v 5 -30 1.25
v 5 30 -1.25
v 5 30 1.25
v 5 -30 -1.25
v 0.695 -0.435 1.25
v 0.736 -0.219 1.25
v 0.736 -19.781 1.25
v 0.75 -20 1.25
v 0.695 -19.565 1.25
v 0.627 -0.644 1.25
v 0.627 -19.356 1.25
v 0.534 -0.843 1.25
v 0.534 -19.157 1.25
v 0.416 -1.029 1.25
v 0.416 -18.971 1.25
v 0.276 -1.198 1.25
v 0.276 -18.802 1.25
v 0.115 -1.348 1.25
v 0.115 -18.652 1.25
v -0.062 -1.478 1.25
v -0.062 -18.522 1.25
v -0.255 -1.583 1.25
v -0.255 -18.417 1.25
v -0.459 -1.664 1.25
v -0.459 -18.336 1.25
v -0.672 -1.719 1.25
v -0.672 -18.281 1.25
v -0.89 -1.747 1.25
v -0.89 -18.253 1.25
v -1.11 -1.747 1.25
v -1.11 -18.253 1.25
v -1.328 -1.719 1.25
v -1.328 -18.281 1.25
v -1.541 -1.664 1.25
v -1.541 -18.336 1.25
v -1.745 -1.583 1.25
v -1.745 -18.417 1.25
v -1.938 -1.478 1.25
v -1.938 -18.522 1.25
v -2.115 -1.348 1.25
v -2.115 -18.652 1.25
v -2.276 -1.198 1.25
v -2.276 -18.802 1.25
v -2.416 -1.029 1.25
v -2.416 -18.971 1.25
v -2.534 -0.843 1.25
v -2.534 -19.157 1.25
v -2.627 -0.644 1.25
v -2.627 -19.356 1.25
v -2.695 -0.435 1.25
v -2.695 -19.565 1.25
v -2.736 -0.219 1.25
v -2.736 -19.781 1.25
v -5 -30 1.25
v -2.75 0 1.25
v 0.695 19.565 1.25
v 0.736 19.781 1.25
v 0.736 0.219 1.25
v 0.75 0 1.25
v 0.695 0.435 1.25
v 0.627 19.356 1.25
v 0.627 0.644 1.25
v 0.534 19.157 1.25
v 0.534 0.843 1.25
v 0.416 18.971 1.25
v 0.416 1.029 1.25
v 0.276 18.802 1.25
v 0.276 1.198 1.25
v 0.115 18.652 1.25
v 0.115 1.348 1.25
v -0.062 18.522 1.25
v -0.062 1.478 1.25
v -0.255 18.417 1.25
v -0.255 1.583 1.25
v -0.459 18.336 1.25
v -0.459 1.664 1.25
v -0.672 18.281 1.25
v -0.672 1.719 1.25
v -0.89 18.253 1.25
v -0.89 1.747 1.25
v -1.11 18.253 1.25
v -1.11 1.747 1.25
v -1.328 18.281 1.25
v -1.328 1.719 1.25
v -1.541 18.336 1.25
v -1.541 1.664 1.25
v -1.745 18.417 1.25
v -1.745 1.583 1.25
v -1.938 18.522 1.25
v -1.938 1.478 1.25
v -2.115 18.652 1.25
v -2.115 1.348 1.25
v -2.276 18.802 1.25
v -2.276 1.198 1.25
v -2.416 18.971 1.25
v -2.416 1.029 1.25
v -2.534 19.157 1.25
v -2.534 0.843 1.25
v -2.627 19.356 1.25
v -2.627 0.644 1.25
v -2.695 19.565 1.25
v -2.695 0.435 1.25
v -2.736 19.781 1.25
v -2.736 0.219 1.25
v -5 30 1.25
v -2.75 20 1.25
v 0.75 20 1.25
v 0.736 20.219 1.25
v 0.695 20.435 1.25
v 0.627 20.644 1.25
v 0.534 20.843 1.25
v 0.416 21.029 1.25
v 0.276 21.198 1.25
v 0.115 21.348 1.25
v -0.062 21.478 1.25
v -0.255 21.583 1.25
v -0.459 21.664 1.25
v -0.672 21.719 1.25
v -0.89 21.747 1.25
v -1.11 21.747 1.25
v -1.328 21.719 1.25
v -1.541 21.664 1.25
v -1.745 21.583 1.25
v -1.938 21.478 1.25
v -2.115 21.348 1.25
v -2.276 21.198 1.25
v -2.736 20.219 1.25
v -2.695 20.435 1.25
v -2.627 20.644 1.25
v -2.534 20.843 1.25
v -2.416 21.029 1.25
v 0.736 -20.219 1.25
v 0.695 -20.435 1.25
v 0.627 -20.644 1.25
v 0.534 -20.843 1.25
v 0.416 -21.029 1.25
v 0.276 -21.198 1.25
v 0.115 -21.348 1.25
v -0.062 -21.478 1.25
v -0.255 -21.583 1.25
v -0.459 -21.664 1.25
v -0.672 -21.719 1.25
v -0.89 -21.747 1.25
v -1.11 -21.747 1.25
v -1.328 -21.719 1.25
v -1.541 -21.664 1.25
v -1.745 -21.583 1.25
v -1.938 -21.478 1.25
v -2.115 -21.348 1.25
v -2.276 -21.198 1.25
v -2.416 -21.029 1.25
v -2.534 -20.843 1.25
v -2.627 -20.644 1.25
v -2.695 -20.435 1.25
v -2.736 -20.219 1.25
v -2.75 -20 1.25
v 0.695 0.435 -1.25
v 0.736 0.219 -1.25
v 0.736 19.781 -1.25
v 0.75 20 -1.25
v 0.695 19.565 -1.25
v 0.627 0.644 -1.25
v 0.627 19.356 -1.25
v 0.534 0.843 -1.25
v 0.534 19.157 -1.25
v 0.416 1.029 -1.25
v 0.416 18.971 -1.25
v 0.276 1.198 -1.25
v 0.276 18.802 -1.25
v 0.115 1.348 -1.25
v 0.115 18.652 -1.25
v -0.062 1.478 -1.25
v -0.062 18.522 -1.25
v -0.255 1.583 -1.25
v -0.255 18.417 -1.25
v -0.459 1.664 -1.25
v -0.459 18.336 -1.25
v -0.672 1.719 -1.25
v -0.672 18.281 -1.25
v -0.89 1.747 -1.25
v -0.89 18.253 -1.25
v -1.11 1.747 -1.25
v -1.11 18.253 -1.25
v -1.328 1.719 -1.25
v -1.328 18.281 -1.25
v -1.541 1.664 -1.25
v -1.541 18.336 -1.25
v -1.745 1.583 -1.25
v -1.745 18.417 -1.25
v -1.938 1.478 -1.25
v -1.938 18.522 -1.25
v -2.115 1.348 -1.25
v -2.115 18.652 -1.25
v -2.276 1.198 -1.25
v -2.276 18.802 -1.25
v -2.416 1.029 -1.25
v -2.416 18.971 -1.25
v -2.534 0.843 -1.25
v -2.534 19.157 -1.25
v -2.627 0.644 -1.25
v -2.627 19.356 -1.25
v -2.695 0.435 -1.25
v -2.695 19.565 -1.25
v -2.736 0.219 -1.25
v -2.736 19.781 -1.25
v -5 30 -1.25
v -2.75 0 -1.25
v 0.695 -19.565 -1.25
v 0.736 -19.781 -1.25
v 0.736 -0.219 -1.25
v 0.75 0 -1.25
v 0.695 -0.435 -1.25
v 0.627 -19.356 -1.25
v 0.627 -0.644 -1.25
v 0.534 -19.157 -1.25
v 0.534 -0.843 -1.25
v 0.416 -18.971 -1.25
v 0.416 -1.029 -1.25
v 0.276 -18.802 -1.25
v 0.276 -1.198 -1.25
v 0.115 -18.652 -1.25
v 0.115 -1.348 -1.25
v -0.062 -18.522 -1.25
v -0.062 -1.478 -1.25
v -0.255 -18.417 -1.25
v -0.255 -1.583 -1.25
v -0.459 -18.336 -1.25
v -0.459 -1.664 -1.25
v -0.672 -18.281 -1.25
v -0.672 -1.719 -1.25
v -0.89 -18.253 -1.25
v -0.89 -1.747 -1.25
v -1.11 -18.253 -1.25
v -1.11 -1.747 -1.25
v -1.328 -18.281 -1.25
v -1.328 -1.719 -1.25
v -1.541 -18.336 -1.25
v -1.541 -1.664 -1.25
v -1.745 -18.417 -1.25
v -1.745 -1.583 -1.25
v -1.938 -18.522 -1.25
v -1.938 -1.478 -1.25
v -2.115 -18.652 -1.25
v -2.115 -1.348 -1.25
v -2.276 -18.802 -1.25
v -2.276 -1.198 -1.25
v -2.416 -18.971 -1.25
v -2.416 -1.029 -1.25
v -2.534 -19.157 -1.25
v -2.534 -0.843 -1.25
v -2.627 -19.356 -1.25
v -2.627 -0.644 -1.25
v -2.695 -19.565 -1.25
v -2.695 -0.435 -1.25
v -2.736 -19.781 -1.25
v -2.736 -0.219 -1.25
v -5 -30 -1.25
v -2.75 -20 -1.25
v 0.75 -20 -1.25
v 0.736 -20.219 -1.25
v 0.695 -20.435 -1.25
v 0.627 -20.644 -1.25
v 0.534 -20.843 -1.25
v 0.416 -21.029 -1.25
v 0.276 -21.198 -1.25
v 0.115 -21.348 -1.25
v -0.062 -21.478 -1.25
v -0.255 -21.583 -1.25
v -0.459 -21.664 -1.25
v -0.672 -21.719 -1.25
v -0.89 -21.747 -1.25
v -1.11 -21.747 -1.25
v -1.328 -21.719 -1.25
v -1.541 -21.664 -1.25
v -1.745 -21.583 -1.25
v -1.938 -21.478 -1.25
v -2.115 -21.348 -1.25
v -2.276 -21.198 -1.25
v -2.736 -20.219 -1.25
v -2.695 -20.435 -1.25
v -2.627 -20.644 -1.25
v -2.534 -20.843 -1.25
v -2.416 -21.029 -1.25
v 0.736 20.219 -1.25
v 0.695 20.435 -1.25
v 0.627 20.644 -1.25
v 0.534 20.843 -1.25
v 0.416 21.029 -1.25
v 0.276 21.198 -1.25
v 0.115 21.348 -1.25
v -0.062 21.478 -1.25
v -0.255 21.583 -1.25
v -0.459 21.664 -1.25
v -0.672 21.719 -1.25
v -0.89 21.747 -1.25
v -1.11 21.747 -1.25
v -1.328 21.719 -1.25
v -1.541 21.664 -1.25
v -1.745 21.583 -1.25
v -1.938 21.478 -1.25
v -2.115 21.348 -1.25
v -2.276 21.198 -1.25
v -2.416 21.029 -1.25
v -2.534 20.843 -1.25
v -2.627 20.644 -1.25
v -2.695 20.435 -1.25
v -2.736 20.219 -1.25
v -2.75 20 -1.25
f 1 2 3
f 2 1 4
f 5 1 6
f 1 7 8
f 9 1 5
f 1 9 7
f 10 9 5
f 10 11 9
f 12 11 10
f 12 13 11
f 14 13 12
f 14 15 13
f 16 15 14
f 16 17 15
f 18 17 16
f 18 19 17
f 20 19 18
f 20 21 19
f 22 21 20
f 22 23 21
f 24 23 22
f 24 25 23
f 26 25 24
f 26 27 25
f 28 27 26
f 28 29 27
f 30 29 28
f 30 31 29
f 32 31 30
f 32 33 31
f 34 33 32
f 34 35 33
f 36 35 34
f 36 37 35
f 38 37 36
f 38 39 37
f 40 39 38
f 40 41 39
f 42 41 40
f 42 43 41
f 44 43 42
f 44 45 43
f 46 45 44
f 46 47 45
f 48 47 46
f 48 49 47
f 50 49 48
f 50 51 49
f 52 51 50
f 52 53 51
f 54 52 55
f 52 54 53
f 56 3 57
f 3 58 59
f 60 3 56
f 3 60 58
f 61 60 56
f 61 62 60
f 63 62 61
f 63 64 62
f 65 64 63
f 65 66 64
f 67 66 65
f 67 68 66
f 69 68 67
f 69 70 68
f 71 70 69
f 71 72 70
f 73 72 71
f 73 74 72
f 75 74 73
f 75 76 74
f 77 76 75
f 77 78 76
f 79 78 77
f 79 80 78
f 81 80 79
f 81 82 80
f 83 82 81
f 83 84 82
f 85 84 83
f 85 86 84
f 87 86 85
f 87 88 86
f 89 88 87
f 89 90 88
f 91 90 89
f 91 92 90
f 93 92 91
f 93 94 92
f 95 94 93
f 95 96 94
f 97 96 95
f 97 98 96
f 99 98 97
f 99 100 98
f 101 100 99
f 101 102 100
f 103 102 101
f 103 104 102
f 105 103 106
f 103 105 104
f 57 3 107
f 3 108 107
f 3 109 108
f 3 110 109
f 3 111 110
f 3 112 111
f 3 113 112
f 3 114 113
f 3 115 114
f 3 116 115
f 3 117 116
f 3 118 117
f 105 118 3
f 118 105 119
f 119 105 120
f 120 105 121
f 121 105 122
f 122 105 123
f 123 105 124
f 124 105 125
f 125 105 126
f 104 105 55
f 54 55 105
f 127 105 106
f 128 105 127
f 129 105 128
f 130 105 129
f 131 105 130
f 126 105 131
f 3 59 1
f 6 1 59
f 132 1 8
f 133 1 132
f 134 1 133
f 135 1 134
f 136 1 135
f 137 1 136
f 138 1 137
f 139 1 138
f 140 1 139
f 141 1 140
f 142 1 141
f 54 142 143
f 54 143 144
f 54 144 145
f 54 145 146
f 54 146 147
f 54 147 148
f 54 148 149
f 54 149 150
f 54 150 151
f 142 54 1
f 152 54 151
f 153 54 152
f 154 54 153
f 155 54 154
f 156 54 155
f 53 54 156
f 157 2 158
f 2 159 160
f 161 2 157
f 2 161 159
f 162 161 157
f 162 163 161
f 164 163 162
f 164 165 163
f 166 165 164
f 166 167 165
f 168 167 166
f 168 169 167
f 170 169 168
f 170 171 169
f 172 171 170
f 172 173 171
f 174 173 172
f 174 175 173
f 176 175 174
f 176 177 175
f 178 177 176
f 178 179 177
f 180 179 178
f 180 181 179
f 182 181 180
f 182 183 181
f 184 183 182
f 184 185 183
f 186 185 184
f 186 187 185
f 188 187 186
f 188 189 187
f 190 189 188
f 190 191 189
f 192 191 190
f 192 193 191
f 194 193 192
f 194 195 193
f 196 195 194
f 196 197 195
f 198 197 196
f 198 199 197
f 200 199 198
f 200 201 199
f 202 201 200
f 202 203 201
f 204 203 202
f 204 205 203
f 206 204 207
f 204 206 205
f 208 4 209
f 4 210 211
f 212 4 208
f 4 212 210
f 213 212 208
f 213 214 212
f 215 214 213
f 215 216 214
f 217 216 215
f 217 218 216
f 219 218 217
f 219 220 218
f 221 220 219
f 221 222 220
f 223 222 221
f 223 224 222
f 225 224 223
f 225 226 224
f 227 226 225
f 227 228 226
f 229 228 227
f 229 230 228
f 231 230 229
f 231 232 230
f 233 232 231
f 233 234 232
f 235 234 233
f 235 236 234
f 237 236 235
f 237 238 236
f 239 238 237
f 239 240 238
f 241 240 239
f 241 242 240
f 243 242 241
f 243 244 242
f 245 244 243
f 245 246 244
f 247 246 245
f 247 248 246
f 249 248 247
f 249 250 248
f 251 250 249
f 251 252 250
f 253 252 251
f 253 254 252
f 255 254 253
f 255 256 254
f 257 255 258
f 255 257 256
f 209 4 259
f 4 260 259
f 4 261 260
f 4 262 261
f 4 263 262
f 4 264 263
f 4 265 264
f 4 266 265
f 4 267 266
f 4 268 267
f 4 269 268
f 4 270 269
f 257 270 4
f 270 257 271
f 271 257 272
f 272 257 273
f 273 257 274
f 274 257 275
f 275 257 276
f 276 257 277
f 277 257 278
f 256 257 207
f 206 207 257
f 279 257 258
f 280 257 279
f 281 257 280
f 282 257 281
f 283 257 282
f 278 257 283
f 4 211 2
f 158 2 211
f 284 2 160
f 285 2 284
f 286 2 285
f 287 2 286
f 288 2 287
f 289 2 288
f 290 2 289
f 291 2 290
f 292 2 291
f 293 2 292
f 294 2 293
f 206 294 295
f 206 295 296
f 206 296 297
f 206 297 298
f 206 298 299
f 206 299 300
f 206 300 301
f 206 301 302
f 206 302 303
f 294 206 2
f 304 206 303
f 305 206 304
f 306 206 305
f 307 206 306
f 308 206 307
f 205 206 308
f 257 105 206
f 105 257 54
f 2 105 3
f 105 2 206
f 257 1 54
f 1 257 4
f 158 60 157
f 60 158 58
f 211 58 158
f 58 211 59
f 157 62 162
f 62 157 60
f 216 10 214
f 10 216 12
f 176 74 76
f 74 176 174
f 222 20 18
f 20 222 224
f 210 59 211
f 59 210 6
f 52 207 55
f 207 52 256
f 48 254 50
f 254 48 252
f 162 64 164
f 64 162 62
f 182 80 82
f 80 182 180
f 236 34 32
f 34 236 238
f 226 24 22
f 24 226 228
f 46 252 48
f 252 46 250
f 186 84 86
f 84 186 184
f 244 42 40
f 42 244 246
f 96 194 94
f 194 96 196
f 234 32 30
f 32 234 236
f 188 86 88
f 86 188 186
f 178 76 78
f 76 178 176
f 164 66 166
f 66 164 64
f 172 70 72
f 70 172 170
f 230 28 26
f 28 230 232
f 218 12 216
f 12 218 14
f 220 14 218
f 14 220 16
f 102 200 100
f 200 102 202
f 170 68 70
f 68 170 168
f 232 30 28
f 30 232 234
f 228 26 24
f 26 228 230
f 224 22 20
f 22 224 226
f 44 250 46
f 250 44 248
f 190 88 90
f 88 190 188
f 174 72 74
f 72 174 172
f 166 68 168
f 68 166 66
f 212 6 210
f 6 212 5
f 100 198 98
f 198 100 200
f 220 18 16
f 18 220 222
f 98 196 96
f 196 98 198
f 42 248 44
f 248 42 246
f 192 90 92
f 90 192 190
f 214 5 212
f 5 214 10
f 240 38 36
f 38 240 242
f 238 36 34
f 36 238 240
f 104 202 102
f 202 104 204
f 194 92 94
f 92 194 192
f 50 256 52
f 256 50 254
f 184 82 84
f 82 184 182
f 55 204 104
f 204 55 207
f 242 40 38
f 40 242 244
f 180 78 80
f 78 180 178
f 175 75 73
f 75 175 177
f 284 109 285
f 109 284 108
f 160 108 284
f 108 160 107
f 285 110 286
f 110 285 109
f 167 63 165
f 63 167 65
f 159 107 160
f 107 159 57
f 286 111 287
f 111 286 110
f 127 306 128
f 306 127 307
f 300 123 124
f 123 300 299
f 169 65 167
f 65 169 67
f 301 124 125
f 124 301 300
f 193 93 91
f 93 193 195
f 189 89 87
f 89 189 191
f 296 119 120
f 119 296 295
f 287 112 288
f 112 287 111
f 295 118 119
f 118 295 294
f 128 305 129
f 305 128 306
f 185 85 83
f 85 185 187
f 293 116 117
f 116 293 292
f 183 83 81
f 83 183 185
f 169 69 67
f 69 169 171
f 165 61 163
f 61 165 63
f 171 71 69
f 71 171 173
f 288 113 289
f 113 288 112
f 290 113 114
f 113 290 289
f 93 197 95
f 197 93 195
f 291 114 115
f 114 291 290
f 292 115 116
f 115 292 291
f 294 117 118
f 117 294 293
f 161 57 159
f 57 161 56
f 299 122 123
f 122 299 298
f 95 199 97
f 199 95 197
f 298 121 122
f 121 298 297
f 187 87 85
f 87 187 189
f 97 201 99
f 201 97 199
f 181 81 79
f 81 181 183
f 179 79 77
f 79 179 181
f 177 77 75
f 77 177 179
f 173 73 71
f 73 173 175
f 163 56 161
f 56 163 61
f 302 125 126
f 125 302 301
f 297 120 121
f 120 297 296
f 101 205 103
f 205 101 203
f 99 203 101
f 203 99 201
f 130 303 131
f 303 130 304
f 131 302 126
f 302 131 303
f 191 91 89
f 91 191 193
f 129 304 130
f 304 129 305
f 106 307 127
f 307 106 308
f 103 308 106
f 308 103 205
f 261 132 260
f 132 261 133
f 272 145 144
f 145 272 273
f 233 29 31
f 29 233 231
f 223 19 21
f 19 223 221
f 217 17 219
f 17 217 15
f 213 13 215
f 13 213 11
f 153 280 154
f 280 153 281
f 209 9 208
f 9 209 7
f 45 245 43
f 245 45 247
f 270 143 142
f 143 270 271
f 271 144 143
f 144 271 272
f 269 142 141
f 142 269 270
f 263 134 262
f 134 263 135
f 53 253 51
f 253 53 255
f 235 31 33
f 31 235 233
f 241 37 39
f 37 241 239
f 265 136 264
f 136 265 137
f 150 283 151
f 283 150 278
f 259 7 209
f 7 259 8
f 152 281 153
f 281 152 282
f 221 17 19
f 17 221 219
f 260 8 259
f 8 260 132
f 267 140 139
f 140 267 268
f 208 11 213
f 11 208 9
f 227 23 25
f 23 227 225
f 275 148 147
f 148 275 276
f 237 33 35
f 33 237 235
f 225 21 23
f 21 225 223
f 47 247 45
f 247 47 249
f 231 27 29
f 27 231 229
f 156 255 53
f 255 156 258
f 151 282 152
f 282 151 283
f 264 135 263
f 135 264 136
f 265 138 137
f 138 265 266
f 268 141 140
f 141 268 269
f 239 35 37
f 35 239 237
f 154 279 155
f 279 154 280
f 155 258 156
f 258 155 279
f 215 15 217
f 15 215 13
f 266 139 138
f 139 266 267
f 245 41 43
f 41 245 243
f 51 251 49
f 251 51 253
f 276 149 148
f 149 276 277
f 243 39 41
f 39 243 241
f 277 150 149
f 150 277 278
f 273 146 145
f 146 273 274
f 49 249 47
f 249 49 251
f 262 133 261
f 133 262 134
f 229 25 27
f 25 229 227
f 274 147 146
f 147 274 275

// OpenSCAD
barretta();

module barretta(){
difference(){
 cube([10,60,2.5],center=true);
    translate([-1,0,0])
    cylinder(h=30,r=3.5/2,$fn=50,center=true);
    translate([-1,20,0])
    cylinder(h=30,r=3.5/2,$fn=50,center=true);
      translate([-1,-20,0])
    cylinder(h=30,r=3.5/2,$fn=50,center=true);
}
}
